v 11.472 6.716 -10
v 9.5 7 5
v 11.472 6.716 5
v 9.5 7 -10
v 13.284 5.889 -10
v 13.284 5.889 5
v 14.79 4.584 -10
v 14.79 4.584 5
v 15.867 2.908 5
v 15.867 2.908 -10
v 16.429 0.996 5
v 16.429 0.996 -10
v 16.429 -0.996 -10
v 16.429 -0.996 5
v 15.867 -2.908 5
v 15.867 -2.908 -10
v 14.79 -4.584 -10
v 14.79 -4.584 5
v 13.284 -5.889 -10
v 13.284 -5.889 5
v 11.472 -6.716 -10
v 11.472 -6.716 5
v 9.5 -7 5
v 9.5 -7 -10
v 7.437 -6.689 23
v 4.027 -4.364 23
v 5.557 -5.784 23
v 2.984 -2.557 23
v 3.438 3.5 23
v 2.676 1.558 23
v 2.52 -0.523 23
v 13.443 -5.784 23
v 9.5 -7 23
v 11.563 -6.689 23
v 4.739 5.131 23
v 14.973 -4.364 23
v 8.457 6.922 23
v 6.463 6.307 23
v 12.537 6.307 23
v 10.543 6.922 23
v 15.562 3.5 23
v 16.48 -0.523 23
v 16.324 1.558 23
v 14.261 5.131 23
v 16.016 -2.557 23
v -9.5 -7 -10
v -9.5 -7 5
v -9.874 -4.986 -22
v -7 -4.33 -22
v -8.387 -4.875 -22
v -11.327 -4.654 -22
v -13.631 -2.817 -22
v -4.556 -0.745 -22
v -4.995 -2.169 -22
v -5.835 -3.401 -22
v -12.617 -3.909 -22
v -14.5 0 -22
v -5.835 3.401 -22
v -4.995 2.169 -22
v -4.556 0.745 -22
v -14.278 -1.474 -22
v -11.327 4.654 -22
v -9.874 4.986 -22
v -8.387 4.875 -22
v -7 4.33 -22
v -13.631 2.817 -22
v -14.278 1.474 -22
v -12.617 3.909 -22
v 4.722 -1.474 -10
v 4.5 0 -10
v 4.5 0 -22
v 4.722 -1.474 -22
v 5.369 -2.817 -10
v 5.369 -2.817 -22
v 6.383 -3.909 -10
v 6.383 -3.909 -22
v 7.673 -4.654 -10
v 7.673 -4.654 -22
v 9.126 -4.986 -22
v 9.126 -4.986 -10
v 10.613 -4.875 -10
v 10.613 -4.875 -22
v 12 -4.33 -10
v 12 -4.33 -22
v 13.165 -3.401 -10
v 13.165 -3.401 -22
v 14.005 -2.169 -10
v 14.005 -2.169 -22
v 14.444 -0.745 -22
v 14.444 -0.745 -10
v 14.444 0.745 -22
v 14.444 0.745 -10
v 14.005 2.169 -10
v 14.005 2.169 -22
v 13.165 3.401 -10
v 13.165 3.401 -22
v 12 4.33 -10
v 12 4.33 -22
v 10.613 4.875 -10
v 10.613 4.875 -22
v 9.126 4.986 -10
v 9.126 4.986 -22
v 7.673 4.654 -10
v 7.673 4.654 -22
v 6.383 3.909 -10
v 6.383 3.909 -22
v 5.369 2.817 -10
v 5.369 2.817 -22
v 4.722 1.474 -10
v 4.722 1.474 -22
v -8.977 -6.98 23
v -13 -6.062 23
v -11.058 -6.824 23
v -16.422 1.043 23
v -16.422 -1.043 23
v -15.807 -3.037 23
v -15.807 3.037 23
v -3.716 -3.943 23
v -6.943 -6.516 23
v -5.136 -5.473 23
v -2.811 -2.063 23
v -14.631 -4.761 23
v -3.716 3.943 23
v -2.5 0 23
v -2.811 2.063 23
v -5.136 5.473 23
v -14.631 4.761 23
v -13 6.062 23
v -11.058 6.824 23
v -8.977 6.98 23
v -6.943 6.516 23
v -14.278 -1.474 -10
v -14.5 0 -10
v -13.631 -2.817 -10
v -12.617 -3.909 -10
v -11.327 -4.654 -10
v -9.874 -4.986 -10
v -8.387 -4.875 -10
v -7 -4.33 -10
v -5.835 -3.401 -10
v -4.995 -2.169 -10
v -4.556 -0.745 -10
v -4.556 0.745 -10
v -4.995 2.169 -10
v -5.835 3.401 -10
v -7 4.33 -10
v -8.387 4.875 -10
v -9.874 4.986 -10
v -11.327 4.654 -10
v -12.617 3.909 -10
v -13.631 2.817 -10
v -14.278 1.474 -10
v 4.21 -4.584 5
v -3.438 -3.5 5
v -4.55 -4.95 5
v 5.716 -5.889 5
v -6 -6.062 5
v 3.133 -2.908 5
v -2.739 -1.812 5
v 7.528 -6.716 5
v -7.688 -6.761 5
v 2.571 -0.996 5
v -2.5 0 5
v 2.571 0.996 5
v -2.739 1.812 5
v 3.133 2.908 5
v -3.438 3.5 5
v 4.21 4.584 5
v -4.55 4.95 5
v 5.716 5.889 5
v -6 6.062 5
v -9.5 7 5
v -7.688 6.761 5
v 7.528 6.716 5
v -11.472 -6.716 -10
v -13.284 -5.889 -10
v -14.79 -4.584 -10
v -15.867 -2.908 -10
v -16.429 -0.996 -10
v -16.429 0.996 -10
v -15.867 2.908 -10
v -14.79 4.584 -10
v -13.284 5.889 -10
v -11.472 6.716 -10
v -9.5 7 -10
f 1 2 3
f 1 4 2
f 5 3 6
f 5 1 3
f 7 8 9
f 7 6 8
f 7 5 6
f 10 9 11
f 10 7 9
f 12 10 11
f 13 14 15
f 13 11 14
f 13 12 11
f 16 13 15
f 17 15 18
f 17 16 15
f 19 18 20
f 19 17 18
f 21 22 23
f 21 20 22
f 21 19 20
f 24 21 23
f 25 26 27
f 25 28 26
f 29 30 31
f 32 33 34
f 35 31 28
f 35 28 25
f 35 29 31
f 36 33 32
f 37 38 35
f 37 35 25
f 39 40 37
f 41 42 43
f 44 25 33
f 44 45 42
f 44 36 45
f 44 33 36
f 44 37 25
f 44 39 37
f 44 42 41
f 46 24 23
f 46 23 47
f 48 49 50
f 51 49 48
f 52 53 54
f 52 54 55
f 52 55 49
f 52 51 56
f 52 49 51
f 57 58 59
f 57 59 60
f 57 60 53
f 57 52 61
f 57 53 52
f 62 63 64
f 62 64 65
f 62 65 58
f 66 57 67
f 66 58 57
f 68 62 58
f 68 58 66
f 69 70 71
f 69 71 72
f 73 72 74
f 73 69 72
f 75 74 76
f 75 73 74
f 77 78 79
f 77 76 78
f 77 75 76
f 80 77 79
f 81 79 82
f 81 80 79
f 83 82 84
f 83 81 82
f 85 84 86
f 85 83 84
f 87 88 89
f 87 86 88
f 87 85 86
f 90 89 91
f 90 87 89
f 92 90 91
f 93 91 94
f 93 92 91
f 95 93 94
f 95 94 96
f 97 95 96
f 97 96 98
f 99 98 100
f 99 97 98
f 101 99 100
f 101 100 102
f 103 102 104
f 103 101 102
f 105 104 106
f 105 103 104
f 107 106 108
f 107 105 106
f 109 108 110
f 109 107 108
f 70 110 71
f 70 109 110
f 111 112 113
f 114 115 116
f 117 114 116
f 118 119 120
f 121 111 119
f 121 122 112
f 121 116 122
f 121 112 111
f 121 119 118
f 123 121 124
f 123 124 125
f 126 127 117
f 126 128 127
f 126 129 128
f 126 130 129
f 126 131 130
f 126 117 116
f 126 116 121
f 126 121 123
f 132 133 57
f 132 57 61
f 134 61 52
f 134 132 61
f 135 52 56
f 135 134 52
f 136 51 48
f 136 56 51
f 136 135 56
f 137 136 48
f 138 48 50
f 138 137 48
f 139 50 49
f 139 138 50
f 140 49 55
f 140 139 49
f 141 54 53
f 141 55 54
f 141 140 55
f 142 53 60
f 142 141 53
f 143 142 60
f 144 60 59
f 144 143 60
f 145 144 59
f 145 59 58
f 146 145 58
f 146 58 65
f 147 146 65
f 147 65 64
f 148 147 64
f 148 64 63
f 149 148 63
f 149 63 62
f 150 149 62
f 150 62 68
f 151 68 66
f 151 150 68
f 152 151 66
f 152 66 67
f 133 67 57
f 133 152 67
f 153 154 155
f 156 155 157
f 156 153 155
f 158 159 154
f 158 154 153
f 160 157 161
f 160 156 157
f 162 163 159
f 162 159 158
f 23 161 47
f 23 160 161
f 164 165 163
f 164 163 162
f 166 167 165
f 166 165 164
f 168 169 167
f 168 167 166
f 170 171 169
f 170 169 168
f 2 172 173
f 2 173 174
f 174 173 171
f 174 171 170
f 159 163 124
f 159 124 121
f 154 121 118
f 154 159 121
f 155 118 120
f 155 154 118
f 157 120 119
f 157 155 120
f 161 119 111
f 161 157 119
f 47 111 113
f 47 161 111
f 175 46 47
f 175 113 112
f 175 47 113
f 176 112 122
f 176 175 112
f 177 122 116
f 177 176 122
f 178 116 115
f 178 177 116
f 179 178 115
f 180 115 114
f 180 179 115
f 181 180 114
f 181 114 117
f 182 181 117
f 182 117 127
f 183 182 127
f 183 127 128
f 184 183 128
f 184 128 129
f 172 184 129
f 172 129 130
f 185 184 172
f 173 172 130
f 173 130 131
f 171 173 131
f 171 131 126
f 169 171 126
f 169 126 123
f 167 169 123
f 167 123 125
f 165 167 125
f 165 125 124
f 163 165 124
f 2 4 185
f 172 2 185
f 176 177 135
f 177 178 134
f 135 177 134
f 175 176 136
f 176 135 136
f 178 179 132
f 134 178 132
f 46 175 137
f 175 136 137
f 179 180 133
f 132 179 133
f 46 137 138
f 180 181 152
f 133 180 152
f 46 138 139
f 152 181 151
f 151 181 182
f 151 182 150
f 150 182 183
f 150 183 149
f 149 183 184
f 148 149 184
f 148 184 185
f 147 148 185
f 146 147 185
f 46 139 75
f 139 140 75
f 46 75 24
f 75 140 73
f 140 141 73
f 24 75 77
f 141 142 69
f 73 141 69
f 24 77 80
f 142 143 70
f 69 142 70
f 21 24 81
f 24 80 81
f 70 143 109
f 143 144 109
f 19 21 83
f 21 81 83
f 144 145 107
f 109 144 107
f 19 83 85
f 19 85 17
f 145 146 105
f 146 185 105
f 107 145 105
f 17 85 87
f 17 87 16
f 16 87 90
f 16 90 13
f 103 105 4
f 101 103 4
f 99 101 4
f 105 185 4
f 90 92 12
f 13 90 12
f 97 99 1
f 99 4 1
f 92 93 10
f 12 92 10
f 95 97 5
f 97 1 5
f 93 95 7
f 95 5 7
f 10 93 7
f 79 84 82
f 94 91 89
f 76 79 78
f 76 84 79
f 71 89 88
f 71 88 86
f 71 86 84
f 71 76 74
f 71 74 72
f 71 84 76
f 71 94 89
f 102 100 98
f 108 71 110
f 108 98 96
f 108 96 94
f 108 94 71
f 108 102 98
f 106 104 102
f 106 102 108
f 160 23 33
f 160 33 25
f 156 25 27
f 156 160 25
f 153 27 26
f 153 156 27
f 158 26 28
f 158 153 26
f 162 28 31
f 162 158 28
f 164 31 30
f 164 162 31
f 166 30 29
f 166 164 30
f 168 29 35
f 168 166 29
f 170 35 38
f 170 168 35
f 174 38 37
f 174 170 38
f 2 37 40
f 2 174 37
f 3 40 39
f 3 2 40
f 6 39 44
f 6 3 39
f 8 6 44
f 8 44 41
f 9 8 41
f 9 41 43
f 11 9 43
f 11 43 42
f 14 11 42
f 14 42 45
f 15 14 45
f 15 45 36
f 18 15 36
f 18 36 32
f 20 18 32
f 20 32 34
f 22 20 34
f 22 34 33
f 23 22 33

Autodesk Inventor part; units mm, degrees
ref_plane "YZ Plane" through (0, 0, 0) normal (1, 0, 0) x (0, 1, 0)
ref_plane "XZ Plane" through (0, 0, 0) normal (0, 1, 0) x (-1, 0, 0)
ref_plane "XY Plane" through (0, 0, 0) normal (0, 0, 1) x (1, 0, 0)
sketch "Эскиз1" plane through (0, 0, 0) normal (0, 0, 1) x (1, 0, 0)
  circle A0 centre (-9.5, 0) radius 7
  circle A1 centre (9.5, 0) radius 7
  line L0 (16.5, 0) -> (-16.5, 0)
  line L1 (9.5, -7) -> (-9.5, -7)
  line L2 (9.5, 7) -> (-9.5, 7)
  point P0 (0, 0)
  point P1 (0, 0)
  dimension "d0" = 14
  dimension "d1" = 14
  dimension "d2" = 33
extrude "Выдавливание1" add sketch "Эскиз1" along normal blind 5 and the other way blind 10
sketch "Эскиз2" plane through (0, 0, 5) normal (0, 0, 1) x (1, 0, 0)
  arc A0 (9.5, -7) -> (9.5, 7) centre (9.5, 0) ccw projected
  circle A1 centre (9.5, 0) radius 7
  arc A2 (-9.5, 7) -> (-9.5, -7) centre (-9.5, 0) ccw projected
  circle A3 centre (-9.5, 0) radius 7
  point P0 (0, 0)
  point P1 (-9.5, -7)
extrude "Выдавливание2" add sketch "Эскиз2" along normal blind 18
sketch "Эскиз3" plane through (0, 0, -10) normal (0, 0, -1) x (-1, 0, 0)
  arc A0 (9.5, -7) -> (9.5, 7) centre (9.5, 0) ccw projected
  circle A1 centre (9.5, 0) radius 5
  arc A2 (-9.5, 7) -> (-9.5, -7) centre (-9.5, 0) ccw projected
  circle A3 centre (-9.5, 0) radius 5
  point P0 (0, 0)
  dimension "d9" = 10
  dimension "d10" = 10
extrude "Выдавливание3" add sketch "Эскиз3" along normal blind 12
ref_plane "РабПлоскость1" through (-90.9653, 8.5, 0) normal (0, 0, 1) x (1, 0, 0)
sketch "Эскиз4" plane through (-90.9653, 8.5, 0) normal (0, 0, 1) x (1, 0, 0)
  circle A0 centre (100.4653, -8.5) radius 7 projected
  circle A1 centre (81.4653, -8.5) radius 7 projected
  arc A2 (100.4653, -15.5) -> (100.4653, -1.5) centre (100.4653, -8.5) ccw projected
  arc A3 (81.4653, -1.5) -> (81.4653, -15.5) centre (81.4653, -8.5) ccw projected
  line L0 (100.4653, -8.5) -> (81.4653, -8.5)
  line L1 (90.9653, -8.5) -> (90.9653, 7)
  line L2 (90.9653, -8.5) -> (70, -8.5)
properties part number "banana plug"
